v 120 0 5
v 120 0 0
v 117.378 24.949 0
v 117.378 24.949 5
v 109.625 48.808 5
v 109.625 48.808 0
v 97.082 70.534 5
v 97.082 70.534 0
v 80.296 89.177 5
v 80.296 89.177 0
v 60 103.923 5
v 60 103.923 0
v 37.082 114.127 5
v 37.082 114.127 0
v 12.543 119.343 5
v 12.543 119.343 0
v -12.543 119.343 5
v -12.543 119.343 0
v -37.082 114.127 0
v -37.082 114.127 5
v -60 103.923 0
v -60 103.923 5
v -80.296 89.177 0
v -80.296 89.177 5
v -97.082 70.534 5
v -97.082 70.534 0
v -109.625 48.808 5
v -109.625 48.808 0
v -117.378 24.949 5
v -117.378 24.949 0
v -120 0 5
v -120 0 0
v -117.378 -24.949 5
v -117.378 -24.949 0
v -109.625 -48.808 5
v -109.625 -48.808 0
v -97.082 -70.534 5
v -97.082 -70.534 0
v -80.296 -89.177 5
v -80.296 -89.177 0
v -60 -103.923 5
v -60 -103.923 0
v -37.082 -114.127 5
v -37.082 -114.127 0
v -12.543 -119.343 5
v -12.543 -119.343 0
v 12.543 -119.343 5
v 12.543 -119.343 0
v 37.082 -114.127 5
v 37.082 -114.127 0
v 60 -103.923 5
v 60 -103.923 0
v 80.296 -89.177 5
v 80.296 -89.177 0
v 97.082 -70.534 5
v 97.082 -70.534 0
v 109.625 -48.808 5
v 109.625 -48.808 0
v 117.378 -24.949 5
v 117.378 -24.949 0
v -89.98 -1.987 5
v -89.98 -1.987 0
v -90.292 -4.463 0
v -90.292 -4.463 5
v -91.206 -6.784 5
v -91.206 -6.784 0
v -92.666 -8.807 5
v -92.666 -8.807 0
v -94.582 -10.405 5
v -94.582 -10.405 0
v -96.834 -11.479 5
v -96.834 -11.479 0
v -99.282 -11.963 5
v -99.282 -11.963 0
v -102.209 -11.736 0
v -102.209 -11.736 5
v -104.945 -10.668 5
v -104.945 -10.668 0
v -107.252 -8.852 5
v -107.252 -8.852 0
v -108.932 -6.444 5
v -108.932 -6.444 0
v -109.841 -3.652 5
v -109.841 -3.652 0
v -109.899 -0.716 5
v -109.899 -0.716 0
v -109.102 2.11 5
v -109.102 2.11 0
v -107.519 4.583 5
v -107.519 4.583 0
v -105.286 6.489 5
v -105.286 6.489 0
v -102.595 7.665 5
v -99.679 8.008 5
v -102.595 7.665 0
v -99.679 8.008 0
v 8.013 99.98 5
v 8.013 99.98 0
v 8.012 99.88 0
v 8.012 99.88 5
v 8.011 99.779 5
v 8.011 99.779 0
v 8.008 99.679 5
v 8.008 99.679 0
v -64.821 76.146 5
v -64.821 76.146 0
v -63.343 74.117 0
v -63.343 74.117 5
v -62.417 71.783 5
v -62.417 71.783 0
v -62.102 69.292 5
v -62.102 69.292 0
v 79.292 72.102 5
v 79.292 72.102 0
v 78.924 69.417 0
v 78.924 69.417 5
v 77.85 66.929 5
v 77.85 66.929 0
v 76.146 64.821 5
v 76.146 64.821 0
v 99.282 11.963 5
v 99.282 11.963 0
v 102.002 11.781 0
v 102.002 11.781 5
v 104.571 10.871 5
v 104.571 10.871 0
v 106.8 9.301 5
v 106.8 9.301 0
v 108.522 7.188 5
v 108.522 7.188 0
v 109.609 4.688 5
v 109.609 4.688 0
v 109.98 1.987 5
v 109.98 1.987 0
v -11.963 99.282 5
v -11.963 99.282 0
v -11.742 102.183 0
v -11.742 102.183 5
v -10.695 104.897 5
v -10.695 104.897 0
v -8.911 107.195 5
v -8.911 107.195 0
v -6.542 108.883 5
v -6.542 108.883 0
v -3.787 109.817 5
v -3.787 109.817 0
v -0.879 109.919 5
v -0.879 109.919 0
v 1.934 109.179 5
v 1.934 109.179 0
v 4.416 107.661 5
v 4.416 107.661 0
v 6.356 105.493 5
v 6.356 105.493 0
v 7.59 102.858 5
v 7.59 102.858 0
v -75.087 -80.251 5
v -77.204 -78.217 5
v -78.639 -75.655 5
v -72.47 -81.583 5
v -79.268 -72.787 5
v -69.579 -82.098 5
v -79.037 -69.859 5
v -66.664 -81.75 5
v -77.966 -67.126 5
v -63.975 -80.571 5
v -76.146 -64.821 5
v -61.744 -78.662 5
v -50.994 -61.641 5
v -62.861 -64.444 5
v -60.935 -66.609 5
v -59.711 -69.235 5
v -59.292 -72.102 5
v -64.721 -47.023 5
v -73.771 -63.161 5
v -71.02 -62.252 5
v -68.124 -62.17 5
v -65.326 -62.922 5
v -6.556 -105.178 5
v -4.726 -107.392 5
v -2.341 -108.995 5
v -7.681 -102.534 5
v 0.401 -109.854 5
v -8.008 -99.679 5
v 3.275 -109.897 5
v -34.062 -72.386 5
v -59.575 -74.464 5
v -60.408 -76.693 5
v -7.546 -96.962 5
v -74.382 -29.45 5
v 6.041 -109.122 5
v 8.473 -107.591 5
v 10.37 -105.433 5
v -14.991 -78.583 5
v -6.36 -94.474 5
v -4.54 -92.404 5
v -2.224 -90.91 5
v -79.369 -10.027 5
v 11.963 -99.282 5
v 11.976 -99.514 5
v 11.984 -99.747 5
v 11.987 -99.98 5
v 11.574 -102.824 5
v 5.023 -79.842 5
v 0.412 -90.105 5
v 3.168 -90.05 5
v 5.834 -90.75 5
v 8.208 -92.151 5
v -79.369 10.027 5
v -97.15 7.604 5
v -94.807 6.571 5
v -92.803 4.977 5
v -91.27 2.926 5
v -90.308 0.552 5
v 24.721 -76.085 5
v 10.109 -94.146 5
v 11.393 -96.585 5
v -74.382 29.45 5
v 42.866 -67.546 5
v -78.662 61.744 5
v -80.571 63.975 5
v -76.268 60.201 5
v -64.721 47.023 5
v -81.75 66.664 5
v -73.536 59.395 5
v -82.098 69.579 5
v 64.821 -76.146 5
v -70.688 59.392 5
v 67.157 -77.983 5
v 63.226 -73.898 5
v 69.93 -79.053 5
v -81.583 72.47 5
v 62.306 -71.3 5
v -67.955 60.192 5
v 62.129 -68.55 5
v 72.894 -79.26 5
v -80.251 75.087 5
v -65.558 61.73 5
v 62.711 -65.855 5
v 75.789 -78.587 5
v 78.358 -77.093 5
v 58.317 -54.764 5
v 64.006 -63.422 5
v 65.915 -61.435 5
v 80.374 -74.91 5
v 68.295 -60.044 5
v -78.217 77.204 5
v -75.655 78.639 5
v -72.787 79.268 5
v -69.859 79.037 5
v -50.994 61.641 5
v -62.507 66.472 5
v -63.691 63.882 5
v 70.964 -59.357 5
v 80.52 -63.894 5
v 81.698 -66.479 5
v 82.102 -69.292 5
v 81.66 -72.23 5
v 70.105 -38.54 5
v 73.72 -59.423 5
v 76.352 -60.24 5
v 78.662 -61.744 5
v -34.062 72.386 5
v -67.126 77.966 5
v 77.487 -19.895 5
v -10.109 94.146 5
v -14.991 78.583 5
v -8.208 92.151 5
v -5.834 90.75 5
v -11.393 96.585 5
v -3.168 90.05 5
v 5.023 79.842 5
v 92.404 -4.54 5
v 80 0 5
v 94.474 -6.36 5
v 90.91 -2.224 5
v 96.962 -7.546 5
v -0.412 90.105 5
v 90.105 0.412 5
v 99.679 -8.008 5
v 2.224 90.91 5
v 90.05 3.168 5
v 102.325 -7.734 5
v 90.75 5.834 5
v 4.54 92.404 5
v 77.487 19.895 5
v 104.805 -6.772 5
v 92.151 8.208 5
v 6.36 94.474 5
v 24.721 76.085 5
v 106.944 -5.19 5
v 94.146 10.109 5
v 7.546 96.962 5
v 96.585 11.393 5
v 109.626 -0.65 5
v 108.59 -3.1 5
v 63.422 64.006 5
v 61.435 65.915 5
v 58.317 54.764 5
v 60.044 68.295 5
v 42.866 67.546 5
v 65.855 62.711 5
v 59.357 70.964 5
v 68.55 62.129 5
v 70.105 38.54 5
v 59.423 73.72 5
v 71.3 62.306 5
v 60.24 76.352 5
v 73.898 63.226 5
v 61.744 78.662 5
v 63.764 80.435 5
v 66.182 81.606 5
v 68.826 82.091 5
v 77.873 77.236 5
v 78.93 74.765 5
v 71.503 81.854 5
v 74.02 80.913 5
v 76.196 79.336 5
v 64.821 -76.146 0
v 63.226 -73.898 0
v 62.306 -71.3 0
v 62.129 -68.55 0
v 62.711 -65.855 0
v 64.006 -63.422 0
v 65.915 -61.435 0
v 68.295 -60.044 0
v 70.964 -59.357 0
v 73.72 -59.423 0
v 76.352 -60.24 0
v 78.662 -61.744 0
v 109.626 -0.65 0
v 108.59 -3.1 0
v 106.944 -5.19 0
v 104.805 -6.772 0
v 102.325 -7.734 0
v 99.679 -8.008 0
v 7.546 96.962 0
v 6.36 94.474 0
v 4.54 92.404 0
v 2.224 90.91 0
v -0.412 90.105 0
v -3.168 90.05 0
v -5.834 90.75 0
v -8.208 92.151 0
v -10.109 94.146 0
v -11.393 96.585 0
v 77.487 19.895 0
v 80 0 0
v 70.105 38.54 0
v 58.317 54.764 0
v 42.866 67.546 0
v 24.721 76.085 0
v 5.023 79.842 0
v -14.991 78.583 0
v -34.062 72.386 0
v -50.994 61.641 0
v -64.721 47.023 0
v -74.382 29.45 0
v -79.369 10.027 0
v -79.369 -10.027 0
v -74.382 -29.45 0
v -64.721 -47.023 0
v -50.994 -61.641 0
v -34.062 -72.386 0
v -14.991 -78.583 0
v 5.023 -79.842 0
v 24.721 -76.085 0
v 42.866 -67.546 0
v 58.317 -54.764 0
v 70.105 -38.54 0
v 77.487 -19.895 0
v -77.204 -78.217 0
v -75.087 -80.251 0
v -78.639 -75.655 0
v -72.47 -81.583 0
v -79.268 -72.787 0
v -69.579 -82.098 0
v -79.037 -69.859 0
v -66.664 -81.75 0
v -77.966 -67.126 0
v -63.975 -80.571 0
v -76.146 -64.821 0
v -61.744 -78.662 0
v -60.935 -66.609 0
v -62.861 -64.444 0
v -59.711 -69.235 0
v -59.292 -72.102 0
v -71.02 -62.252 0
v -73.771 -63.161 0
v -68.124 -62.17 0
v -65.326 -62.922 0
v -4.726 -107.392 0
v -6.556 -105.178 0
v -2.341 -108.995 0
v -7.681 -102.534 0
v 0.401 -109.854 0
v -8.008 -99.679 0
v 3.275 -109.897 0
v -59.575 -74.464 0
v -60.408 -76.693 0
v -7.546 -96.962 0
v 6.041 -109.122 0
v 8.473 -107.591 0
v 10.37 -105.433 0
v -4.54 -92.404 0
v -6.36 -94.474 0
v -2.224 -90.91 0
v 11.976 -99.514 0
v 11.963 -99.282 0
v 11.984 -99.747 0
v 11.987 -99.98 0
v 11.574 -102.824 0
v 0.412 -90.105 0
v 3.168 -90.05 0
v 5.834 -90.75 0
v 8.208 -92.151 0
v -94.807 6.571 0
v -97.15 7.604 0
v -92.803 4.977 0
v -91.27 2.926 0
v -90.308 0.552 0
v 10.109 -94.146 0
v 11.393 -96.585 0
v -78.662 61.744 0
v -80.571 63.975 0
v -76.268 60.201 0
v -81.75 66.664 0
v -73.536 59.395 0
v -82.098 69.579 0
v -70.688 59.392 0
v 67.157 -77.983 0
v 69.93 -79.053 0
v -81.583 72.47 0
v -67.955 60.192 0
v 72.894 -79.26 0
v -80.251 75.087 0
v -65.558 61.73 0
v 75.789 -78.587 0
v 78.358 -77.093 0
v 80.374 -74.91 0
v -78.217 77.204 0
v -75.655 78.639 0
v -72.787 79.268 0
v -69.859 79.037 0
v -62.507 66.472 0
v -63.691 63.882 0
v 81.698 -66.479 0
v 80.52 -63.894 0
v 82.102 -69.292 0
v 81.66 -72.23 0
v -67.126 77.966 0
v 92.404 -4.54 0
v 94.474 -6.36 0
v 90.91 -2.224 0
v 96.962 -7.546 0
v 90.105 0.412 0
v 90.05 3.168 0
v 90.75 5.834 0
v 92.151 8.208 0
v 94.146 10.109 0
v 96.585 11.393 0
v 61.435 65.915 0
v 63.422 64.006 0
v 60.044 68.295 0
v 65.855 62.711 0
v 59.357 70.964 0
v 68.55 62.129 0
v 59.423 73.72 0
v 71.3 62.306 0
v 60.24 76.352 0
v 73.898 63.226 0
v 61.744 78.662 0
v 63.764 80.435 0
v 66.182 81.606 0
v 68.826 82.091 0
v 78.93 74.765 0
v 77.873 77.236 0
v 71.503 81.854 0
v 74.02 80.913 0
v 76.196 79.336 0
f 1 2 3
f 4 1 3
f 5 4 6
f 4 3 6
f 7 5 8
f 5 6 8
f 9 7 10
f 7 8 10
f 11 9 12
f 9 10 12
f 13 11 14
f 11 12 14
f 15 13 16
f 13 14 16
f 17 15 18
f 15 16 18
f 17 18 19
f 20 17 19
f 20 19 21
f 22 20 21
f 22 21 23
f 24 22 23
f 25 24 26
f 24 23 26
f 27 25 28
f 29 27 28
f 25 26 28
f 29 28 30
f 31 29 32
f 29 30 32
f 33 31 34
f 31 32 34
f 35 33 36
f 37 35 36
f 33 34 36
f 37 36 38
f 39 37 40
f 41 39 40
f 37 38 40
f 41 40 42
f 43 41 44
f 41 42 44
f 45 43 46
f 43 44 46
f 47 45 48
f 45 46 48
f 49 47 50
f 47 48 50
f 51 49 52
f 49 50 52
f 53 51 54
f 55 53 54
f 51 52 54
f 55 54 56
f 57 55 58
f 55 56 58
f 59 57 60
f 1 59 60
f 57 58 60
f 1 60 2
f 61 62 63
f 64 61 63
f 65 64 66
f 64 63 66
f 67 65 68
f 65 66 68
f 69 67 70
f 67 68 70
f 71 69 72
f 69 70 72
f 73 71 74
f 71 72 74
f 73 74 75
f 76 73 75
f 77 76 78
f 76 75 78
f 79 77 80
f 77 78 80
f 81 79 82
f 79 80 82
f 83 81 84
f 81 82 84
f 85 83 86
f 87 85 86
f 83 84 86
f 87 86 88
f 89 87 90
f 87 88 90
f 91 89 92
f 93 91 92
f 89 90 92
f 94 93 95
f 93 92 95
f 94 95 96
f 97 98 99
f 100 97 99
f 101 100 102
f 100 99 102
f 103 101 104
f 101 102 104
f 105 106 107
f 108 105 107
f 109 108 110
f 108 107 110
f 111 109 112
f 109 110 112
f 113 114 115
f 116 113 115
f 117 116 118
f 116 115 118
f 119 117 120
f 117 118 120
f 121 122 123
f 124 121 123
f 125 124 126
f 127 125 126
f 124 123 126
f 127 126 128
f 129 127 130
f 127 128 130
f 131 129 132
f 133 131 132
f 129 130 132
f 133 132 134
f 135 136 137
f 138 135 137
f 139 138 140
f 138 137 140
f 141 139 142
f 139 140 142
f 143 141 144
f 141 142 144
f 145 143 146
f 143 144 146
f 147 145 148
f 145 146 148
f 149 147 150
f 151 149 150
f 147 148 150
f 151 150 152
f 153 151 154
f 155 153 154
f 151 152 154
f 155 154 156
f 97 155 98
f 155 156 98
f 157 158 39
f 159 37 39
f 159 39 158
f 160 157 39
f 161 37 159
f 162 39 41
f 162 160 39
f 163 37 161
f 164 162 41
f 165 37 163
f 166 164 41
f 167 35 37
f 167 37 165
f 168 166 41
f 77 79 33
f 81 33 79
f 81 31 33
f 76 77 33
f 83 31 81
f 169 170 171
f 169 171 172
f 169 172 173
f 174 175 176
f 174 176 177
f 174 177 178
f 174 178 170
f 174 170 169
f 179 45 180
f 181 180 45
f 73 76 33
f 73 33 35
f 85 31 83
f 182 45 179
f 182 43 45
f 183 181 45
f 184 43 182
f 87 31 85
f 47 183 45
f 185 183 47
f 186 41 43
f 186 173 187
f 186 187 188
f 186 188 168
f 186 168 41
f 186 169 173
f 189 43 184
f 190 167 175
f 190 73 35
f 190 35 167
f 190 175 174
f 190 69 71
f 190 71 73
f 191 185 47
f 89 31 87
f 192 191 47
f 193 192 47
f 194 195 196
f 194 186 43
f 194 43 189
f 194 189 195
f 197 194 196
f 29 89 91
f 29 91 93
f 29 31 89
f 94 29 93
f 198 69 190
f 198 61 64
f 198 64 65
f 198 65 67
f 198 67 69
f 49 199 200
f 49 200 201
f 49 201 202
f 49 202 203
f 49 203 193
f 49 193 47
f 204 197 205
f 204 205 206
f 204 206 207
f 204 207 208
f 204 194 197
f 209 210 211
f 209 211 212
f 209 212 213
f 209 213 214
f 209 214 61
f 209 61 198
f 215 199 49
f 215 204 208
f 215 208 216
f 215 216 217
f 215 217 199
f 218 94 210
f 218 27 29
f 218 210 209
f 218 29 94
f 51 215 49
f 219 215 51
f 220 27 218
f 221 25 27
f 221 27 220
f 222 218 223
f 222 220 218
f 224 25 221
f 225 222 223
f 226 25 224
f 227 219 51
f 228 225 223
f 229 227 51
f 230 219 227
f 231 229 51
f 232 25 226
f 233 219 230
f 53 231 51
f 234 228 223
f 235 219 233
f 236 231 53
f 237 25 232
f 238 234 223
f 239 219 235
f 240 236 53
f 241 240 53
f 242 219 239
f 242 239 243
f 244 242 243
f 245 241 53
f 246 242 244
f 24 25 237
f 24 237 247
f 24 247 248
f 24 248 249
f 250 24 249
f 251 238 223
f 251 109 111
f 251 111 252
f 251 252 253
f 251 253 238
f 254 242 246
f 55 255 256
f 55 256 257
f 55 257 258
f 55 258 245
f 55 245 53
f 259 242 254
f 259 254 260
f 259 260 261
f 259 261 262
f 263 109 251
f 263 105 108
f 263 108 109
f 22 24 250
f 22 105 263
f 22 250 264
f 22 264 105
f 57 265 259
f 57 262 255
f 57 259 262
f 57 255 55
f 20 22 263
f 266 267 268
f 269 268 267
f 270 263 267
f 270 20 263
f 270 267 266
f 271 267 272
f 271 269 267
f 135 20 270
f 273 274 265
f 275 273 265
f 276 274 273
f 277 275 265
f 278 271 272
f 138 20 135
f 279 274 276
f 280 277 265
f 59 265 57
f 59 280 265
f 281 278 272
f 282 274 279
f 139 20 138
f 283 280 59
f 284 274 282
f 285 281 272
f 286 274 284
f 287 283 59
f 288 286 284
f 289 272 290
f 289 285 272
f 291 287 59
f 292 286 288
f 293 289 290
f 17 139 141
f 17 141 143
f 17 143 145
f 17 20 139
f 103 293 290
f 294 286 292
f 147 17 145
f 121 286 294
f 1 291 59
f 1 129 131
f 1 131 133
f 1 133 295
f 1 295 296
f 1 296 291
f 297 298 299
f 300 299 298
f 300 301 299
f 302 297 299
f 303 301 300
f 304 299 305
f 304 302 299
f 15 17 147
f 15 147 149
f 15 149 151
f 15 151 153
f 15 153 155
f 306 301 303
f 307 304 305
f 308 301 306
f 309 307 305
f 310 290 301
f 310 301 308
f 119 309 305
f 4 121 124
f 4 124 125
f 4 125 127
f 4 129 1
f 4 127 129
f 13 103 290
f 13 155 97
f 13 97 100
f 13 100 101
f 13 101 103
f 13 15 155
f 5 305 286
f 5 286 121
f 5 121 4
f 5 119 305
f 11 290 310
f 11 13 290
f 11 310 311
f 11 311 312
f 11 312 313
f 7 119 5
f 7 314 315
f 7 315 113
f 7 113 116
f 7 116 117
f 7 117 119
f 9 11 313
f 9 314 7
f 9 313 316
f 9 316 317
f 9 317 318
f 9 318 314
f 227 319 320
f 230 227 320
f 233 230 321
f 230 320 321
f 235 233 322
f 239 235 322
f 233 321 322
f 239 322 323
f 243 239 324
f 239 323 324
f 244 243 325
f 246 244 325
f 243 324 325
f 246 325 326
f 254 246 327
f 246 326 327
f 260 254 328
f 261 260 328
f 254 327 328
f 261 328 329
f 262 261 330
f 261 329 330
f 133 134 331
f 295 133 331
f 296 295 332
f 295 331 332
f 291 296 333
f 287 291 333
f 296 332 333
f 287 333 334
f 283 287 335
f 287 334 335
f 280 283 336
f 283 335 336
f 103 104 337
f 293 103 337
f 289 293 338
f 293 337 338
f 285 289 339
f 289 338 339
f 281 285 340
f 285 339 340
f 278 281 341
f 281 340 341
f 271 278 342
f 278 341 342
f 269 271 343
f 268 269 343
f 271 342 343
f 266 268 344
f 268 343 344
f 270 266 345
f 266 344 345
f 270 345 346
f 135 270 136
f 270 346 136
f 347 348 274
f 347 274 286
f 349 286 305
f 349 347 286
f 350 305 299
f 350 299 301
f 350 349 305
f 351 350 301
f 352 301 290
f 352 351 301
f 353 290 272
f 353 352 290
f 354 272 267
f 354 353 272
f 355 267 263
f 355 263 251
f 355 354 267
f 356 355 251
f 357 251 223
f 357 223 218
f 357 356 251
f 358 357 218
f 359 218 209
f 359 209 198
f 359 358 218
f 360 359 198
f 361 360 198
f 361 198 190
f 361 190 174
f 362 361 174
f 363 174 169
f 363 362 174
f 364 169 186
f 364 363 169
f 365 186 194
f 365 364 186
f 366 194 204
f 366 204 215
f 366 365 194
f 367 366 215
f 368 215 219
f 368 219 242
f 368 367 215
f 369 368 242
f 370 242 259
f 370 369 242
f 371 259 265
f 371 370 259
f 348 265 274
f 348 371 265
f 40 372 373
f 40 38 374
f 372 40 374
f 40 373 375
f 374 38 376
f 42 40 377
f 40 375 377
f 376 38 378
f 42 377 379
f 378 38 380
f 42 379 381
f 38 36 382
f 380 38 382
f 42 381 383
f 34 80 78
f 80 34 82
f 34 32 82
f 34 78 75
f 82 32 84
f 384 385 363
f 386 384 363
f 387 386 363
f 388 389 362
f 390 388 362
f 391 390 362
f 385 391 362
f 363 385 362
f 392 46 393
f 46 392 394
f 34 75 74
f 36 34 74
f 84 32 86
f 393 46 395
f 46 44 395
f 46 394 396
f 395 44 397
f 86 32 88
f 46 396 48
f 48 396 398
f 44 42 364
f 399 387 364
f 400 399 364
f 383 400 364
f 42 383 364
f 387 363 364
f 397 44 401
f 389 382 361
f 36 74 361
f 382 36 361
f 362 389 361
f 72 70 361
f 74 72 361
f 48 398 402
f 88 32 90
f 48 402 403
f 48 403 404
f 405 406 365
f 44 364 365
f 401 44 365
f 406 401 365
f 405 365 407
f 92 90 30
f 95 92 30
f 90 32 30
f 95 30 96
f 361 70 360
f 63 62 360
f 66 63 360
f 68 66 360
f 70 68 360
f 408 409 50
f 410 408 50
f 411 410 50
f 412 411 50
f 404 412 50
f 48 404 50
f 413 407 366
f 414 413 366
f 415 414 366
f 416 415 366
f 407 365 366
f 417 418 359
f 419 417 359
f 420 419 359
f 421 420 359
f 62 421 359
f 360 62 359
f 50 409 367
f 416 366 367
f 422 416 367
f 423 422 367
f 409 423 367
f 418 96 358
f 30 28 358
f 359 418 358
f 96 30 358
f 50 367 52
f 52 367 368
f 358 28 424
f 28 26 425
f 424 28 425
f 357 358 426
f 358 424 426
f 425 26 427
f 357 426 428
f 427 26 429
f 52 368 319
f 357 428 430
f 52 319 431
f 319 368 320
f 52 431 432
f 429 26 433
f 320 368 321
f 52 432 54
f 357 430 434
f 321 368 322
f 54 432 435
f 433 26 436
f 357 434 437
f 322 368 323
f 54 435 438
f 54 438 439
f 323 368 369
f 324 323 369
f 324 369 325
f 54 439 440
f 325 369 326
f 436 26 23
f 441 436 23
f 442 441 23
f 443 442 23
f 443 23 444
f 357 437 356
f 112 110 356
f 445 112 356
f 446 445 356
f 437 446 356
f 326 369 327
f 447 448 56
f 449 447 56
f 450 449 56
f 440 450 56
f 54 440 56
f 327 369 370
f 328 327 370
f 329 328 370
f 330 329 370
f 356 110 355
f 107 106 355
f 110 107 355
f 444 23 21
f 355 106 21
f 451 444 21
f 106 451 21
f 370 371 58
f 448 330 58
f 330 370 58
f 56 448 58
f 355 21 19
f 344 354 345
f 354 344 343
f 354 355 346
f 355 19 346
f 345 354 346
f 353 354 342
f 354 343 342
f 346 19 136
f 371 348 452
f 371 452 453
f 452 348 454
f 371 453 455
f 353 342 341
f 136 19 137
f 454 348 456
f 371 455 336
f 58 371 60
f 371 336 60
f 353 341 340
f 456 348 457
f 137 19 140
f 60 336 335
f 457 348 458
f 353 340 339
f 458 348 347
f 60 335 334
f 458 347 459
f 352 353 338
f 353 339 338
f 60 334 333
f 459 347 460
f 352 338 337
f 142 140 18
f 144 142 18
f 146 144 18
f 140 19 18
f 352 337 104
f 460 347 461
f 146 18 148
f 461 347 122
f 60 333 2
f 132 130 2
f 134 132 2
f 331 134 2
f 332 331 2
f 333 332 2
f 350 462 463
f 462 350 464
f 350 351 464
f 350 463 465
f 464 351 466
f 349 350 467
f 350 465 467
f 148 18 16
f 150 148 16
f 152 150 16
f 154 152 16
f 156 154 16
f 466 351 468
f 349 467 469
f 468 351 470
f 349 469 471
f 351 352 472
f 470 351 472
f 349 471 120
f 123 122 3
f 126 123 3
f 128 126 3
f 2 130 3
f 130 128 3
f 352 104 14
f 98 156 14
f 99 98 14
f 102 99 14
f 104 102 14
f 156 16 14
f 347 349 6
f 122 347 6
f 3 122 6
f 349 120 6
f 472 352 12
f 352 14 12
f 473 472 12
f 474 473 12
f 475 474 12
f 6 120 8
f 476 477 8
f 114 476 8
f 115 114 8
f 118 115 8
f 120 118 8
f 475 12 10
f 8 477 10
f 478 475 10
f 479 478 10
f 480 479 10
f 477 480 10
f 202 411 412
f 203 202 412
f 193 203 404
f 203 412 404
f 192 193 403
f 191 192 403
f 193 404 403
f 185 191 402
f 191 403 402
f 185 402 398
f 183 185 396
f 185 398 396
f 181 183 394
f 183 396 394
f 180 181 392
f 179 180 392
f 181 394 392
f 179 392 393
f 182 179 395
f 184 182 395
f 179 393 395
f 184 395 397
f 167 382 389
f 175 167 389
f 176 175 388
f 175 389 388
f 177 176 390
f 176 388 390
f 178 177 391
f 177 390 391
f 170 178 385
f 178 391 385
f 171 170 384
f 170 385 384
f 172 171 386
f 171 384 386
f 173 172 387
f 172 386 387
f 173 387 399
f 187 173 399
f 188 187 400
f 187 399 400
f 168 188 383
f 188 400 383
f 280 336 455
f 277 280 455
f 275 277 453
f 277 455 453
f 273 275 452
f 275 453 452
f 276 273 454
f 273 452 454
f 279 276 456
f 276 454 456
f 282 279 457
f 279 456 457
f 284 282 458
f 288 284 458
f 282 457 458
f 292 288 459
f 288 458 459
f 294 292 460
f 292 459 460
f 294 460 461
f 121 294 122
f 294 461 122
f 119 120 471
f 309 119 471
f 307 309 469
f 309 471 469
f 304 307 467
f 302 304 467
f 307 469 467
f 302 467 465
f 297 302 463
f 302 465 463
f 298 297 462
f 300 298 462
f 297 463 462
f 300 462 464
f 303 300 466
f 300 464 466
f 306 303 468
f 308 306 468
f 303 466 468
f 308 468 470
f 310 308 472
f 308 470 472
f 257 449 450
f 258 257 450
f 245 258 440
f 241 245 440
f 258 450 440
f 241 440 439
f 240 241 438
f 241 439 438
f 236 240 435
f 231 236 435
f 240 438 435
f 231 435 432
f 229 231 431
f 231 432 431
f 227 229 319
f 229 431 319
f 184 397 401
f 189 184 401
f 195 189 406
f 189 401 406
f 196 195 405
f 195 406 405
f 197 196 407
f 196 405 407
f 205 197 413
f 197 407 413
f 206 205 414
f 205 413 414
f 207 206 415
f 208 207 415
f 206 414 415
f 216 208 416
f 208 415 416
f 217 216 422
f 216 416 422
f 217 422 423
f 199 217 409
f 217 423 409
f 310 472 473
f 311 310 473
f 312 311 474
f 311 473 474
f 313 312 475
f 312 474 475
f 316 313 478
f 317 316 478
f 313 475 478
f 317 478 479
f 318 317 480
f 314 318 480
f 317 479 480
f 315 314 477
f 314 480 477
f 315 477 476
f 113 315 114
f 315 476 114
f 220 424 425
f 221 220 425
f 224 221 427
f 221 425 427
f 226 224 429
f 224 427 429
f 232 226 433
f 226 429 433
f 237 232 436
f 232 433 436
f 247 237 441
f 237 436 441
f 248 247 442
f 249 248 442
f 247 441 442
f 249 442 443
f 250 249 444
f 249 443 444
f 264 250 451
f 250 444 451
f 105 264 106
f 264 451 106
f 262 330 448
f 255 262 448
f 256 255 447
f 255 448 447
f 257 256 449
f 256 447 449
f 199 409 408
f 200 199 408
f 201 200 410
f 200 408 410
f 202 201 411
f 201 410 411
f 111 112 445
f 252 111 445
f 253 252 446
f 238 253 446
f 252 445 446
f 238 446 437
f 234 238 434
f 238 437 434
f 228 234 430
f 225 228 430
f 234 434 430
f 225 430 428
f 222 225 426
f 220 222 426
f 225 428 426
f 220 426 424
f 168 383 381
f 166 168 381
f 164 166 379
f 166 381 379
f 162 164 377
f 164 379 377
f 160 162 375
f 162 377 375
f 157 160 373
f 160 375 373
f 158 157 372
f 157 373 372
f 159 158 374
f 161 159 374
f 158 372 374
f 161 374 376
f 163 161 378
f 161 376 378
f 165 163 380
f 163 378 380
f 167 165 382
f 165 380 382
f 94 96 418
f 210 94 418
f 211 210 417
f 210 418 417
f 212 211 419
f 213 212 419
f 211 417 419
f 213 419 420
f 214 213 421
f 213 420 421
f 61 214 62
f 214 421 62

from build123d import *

# Parameters (mm, degrees)
F0_R     = 120
F1_DEPTH = 5
F0_R_2   = 80
F2_DEPTH = 5


with BuildPart() as f1:
    # F0 (on Top) → F1 (new body)
    with BuildSketch(Plane.XY):
        Circle(F0_R)
        with BuildLine():
            ThreePointArc((76.146291, 64.820848), (91.609258, 40.096681), (99.281886, 11.962742))
            ThreePointArc((99.281886, 11.962742), (106.799943, 9.30097), (109.980254, 1.987158))
            ThreePointArc((109.980254, 1.987158), (106.943933, -5.189692), (99.67882, -8.008298))
            ThreePointArc((99.67882, -8.008298), (93.130163, -36.424892), (78.661831, -61.743959))
            ThreePointArc((78.661831, -61.743959), (81.201294, -65.144284), (82.101848, -69.291583))
            ThreePointArc((82.101848, -69.291583), (75.788988, -78.587012), (64.820848, -76.146291))
            ThreePointArc((64.820848, -76.146291), (40.096681, -91.609258), (11.962742, -99.281886))
            ThreePointArc((11.962742, -99.281886), (11.981052, -99.630856), (11.987158, -99.980254))
            ThreePointArc((11.987158, -99.980254), (1.836424, -109.979118), (-8.008298, -99.67882))
            ThreePointArc((-8.008298, -99.67882), (-36.424892, -93.130163), (-61.743959, -78.661831))
            ThreePointArc((-61.743959, -78.661831), (-76.220741, -79.312033), (-76.146291, -64.820848))
            ThreePointArc((-76.146291, -64.820848), (-91.609258, -40.096681), (-99.281886, -11.962742))
            ThreePointArc((-99.281886, -11.962742), (-109.978279, -2.185874), (-99.67882, 8.008298))
            ThreePointArc((-99.67882, 8.008298), (-93.130163, 36.424892), (-78.661831, 61.743959))
            ThreePointArc((-78.661831, 61.743959), (-79.312033, 76.220741), (-64.820848, 76.146291))
            ThreePointArc((-64.820848, 76.146291), (-40.096681, 91.609258), (-11.962742, 99.281886))
            ThreePointArc((-11.962742, 99.281886), (-2.336555, 109.974148), (8.012842, 99.980254))
            ThreePointArc((8.012842, 99.980254), (8.011706, 99.82952), (8.008298, 99.67882))
            ThreePointArc((8.008298, 99.67882), (36.424892, 93.130163), (61.743959, 78.661831))
            ThreePointArc((61.743959, 78.661831), (72.793279, 81.468711), (79.291583, 72.101848))
            ThreePointArc((79.291583, 72.101848), (78.471645, 68.136189), (76.146291, 64.820848))
        make_face(mode=Mode.SUBTRACT)
    extrude(amount=F1_DEPTH)

    # F0 (on Top) → F2 (join)
    with BuildSketch(Plane.XY):
        with BuildLine():
            ThreePointArc((99.67882, -8.008298), (89.982229, 1.788442), (99.281886, 11.962742))
            ThreePointArc((99.281886, 11.962742), (91.609258, 40.096681), (76.146291, 64.820848))
            ThreePointArc((76.146291, 64.820848), (62.362425, 64.891664), (61.743959, 78.661831))
            ThreePointArc((61.743959, 78.661831), (36.424892, 93.130163), (8.008298, 99.67882))
            ThreePointArc((8.008298, 99.67882), (-1.788442, 89.982229), (-11.962742, 99.281886))
            ThreePointArc((-11.962742, 99.281886), (-40.096681, 91.609258), (-64.820848, 76.146291))
            ThreePointArc((-64.820848, 76.146291), (-62.806419, 72.978722), (-62.101848, 69.291583))
            ThreePointArc((-62.101848, 69.291583), (-67.954549, 60.192137), (-78.661831, 61.743959))
            ThreePointArc((-78.661831, 61.743959), (-93.130163, 36.424892), (-99.67882, 8.008298))
            ThreePointArc((-99.67882, 8.008298), (-92.803404, 4.976522), (-89.980254, -1.987158))
            ThreePointArc((-89.980254, -1.987158), (-92.666442, -8.806847), (-99.281886, -11.962742))
            ThreePointArc((-99.281886, -11.962742), (-91.609258, -40.096681), (-76.146291, -64.820848))
            ThreePointArc((-76.146291, -64.820848), (-65.325923, -62.921786), (-59.291583, -72.101848))
            ThreePointArc((-59.291583, -72.101848), (-59.92472, -75.603545), (-61.743959, -78.661831))
            ThreePointArc((-61.743959, -78.661831), (-36.424892, -93.130163), (-8.008298, -99.67882))
            ThreePointArc((-8.008298, -99.67882), (1.788442, -89.982229), (11.962742, -99.281886))
            ThreePointArc((11.962742, -99.281886), (40.096681, -91.609258), (64.820848, -76.146291))
            ThreePointArc((64.820848, -76.146291), (64.891664, -62.362425), (78.661831, -61.743959))
            ThreePointArc((78.661831, -61.743959), (93.130163, -36.424892), (99.67882, -8.008298))
        make_face()
        Circle(F0_R_2, mode=Mode.SUBTRACT)
    extrude(amount=F2_DEPTH)


solid = f1.part
